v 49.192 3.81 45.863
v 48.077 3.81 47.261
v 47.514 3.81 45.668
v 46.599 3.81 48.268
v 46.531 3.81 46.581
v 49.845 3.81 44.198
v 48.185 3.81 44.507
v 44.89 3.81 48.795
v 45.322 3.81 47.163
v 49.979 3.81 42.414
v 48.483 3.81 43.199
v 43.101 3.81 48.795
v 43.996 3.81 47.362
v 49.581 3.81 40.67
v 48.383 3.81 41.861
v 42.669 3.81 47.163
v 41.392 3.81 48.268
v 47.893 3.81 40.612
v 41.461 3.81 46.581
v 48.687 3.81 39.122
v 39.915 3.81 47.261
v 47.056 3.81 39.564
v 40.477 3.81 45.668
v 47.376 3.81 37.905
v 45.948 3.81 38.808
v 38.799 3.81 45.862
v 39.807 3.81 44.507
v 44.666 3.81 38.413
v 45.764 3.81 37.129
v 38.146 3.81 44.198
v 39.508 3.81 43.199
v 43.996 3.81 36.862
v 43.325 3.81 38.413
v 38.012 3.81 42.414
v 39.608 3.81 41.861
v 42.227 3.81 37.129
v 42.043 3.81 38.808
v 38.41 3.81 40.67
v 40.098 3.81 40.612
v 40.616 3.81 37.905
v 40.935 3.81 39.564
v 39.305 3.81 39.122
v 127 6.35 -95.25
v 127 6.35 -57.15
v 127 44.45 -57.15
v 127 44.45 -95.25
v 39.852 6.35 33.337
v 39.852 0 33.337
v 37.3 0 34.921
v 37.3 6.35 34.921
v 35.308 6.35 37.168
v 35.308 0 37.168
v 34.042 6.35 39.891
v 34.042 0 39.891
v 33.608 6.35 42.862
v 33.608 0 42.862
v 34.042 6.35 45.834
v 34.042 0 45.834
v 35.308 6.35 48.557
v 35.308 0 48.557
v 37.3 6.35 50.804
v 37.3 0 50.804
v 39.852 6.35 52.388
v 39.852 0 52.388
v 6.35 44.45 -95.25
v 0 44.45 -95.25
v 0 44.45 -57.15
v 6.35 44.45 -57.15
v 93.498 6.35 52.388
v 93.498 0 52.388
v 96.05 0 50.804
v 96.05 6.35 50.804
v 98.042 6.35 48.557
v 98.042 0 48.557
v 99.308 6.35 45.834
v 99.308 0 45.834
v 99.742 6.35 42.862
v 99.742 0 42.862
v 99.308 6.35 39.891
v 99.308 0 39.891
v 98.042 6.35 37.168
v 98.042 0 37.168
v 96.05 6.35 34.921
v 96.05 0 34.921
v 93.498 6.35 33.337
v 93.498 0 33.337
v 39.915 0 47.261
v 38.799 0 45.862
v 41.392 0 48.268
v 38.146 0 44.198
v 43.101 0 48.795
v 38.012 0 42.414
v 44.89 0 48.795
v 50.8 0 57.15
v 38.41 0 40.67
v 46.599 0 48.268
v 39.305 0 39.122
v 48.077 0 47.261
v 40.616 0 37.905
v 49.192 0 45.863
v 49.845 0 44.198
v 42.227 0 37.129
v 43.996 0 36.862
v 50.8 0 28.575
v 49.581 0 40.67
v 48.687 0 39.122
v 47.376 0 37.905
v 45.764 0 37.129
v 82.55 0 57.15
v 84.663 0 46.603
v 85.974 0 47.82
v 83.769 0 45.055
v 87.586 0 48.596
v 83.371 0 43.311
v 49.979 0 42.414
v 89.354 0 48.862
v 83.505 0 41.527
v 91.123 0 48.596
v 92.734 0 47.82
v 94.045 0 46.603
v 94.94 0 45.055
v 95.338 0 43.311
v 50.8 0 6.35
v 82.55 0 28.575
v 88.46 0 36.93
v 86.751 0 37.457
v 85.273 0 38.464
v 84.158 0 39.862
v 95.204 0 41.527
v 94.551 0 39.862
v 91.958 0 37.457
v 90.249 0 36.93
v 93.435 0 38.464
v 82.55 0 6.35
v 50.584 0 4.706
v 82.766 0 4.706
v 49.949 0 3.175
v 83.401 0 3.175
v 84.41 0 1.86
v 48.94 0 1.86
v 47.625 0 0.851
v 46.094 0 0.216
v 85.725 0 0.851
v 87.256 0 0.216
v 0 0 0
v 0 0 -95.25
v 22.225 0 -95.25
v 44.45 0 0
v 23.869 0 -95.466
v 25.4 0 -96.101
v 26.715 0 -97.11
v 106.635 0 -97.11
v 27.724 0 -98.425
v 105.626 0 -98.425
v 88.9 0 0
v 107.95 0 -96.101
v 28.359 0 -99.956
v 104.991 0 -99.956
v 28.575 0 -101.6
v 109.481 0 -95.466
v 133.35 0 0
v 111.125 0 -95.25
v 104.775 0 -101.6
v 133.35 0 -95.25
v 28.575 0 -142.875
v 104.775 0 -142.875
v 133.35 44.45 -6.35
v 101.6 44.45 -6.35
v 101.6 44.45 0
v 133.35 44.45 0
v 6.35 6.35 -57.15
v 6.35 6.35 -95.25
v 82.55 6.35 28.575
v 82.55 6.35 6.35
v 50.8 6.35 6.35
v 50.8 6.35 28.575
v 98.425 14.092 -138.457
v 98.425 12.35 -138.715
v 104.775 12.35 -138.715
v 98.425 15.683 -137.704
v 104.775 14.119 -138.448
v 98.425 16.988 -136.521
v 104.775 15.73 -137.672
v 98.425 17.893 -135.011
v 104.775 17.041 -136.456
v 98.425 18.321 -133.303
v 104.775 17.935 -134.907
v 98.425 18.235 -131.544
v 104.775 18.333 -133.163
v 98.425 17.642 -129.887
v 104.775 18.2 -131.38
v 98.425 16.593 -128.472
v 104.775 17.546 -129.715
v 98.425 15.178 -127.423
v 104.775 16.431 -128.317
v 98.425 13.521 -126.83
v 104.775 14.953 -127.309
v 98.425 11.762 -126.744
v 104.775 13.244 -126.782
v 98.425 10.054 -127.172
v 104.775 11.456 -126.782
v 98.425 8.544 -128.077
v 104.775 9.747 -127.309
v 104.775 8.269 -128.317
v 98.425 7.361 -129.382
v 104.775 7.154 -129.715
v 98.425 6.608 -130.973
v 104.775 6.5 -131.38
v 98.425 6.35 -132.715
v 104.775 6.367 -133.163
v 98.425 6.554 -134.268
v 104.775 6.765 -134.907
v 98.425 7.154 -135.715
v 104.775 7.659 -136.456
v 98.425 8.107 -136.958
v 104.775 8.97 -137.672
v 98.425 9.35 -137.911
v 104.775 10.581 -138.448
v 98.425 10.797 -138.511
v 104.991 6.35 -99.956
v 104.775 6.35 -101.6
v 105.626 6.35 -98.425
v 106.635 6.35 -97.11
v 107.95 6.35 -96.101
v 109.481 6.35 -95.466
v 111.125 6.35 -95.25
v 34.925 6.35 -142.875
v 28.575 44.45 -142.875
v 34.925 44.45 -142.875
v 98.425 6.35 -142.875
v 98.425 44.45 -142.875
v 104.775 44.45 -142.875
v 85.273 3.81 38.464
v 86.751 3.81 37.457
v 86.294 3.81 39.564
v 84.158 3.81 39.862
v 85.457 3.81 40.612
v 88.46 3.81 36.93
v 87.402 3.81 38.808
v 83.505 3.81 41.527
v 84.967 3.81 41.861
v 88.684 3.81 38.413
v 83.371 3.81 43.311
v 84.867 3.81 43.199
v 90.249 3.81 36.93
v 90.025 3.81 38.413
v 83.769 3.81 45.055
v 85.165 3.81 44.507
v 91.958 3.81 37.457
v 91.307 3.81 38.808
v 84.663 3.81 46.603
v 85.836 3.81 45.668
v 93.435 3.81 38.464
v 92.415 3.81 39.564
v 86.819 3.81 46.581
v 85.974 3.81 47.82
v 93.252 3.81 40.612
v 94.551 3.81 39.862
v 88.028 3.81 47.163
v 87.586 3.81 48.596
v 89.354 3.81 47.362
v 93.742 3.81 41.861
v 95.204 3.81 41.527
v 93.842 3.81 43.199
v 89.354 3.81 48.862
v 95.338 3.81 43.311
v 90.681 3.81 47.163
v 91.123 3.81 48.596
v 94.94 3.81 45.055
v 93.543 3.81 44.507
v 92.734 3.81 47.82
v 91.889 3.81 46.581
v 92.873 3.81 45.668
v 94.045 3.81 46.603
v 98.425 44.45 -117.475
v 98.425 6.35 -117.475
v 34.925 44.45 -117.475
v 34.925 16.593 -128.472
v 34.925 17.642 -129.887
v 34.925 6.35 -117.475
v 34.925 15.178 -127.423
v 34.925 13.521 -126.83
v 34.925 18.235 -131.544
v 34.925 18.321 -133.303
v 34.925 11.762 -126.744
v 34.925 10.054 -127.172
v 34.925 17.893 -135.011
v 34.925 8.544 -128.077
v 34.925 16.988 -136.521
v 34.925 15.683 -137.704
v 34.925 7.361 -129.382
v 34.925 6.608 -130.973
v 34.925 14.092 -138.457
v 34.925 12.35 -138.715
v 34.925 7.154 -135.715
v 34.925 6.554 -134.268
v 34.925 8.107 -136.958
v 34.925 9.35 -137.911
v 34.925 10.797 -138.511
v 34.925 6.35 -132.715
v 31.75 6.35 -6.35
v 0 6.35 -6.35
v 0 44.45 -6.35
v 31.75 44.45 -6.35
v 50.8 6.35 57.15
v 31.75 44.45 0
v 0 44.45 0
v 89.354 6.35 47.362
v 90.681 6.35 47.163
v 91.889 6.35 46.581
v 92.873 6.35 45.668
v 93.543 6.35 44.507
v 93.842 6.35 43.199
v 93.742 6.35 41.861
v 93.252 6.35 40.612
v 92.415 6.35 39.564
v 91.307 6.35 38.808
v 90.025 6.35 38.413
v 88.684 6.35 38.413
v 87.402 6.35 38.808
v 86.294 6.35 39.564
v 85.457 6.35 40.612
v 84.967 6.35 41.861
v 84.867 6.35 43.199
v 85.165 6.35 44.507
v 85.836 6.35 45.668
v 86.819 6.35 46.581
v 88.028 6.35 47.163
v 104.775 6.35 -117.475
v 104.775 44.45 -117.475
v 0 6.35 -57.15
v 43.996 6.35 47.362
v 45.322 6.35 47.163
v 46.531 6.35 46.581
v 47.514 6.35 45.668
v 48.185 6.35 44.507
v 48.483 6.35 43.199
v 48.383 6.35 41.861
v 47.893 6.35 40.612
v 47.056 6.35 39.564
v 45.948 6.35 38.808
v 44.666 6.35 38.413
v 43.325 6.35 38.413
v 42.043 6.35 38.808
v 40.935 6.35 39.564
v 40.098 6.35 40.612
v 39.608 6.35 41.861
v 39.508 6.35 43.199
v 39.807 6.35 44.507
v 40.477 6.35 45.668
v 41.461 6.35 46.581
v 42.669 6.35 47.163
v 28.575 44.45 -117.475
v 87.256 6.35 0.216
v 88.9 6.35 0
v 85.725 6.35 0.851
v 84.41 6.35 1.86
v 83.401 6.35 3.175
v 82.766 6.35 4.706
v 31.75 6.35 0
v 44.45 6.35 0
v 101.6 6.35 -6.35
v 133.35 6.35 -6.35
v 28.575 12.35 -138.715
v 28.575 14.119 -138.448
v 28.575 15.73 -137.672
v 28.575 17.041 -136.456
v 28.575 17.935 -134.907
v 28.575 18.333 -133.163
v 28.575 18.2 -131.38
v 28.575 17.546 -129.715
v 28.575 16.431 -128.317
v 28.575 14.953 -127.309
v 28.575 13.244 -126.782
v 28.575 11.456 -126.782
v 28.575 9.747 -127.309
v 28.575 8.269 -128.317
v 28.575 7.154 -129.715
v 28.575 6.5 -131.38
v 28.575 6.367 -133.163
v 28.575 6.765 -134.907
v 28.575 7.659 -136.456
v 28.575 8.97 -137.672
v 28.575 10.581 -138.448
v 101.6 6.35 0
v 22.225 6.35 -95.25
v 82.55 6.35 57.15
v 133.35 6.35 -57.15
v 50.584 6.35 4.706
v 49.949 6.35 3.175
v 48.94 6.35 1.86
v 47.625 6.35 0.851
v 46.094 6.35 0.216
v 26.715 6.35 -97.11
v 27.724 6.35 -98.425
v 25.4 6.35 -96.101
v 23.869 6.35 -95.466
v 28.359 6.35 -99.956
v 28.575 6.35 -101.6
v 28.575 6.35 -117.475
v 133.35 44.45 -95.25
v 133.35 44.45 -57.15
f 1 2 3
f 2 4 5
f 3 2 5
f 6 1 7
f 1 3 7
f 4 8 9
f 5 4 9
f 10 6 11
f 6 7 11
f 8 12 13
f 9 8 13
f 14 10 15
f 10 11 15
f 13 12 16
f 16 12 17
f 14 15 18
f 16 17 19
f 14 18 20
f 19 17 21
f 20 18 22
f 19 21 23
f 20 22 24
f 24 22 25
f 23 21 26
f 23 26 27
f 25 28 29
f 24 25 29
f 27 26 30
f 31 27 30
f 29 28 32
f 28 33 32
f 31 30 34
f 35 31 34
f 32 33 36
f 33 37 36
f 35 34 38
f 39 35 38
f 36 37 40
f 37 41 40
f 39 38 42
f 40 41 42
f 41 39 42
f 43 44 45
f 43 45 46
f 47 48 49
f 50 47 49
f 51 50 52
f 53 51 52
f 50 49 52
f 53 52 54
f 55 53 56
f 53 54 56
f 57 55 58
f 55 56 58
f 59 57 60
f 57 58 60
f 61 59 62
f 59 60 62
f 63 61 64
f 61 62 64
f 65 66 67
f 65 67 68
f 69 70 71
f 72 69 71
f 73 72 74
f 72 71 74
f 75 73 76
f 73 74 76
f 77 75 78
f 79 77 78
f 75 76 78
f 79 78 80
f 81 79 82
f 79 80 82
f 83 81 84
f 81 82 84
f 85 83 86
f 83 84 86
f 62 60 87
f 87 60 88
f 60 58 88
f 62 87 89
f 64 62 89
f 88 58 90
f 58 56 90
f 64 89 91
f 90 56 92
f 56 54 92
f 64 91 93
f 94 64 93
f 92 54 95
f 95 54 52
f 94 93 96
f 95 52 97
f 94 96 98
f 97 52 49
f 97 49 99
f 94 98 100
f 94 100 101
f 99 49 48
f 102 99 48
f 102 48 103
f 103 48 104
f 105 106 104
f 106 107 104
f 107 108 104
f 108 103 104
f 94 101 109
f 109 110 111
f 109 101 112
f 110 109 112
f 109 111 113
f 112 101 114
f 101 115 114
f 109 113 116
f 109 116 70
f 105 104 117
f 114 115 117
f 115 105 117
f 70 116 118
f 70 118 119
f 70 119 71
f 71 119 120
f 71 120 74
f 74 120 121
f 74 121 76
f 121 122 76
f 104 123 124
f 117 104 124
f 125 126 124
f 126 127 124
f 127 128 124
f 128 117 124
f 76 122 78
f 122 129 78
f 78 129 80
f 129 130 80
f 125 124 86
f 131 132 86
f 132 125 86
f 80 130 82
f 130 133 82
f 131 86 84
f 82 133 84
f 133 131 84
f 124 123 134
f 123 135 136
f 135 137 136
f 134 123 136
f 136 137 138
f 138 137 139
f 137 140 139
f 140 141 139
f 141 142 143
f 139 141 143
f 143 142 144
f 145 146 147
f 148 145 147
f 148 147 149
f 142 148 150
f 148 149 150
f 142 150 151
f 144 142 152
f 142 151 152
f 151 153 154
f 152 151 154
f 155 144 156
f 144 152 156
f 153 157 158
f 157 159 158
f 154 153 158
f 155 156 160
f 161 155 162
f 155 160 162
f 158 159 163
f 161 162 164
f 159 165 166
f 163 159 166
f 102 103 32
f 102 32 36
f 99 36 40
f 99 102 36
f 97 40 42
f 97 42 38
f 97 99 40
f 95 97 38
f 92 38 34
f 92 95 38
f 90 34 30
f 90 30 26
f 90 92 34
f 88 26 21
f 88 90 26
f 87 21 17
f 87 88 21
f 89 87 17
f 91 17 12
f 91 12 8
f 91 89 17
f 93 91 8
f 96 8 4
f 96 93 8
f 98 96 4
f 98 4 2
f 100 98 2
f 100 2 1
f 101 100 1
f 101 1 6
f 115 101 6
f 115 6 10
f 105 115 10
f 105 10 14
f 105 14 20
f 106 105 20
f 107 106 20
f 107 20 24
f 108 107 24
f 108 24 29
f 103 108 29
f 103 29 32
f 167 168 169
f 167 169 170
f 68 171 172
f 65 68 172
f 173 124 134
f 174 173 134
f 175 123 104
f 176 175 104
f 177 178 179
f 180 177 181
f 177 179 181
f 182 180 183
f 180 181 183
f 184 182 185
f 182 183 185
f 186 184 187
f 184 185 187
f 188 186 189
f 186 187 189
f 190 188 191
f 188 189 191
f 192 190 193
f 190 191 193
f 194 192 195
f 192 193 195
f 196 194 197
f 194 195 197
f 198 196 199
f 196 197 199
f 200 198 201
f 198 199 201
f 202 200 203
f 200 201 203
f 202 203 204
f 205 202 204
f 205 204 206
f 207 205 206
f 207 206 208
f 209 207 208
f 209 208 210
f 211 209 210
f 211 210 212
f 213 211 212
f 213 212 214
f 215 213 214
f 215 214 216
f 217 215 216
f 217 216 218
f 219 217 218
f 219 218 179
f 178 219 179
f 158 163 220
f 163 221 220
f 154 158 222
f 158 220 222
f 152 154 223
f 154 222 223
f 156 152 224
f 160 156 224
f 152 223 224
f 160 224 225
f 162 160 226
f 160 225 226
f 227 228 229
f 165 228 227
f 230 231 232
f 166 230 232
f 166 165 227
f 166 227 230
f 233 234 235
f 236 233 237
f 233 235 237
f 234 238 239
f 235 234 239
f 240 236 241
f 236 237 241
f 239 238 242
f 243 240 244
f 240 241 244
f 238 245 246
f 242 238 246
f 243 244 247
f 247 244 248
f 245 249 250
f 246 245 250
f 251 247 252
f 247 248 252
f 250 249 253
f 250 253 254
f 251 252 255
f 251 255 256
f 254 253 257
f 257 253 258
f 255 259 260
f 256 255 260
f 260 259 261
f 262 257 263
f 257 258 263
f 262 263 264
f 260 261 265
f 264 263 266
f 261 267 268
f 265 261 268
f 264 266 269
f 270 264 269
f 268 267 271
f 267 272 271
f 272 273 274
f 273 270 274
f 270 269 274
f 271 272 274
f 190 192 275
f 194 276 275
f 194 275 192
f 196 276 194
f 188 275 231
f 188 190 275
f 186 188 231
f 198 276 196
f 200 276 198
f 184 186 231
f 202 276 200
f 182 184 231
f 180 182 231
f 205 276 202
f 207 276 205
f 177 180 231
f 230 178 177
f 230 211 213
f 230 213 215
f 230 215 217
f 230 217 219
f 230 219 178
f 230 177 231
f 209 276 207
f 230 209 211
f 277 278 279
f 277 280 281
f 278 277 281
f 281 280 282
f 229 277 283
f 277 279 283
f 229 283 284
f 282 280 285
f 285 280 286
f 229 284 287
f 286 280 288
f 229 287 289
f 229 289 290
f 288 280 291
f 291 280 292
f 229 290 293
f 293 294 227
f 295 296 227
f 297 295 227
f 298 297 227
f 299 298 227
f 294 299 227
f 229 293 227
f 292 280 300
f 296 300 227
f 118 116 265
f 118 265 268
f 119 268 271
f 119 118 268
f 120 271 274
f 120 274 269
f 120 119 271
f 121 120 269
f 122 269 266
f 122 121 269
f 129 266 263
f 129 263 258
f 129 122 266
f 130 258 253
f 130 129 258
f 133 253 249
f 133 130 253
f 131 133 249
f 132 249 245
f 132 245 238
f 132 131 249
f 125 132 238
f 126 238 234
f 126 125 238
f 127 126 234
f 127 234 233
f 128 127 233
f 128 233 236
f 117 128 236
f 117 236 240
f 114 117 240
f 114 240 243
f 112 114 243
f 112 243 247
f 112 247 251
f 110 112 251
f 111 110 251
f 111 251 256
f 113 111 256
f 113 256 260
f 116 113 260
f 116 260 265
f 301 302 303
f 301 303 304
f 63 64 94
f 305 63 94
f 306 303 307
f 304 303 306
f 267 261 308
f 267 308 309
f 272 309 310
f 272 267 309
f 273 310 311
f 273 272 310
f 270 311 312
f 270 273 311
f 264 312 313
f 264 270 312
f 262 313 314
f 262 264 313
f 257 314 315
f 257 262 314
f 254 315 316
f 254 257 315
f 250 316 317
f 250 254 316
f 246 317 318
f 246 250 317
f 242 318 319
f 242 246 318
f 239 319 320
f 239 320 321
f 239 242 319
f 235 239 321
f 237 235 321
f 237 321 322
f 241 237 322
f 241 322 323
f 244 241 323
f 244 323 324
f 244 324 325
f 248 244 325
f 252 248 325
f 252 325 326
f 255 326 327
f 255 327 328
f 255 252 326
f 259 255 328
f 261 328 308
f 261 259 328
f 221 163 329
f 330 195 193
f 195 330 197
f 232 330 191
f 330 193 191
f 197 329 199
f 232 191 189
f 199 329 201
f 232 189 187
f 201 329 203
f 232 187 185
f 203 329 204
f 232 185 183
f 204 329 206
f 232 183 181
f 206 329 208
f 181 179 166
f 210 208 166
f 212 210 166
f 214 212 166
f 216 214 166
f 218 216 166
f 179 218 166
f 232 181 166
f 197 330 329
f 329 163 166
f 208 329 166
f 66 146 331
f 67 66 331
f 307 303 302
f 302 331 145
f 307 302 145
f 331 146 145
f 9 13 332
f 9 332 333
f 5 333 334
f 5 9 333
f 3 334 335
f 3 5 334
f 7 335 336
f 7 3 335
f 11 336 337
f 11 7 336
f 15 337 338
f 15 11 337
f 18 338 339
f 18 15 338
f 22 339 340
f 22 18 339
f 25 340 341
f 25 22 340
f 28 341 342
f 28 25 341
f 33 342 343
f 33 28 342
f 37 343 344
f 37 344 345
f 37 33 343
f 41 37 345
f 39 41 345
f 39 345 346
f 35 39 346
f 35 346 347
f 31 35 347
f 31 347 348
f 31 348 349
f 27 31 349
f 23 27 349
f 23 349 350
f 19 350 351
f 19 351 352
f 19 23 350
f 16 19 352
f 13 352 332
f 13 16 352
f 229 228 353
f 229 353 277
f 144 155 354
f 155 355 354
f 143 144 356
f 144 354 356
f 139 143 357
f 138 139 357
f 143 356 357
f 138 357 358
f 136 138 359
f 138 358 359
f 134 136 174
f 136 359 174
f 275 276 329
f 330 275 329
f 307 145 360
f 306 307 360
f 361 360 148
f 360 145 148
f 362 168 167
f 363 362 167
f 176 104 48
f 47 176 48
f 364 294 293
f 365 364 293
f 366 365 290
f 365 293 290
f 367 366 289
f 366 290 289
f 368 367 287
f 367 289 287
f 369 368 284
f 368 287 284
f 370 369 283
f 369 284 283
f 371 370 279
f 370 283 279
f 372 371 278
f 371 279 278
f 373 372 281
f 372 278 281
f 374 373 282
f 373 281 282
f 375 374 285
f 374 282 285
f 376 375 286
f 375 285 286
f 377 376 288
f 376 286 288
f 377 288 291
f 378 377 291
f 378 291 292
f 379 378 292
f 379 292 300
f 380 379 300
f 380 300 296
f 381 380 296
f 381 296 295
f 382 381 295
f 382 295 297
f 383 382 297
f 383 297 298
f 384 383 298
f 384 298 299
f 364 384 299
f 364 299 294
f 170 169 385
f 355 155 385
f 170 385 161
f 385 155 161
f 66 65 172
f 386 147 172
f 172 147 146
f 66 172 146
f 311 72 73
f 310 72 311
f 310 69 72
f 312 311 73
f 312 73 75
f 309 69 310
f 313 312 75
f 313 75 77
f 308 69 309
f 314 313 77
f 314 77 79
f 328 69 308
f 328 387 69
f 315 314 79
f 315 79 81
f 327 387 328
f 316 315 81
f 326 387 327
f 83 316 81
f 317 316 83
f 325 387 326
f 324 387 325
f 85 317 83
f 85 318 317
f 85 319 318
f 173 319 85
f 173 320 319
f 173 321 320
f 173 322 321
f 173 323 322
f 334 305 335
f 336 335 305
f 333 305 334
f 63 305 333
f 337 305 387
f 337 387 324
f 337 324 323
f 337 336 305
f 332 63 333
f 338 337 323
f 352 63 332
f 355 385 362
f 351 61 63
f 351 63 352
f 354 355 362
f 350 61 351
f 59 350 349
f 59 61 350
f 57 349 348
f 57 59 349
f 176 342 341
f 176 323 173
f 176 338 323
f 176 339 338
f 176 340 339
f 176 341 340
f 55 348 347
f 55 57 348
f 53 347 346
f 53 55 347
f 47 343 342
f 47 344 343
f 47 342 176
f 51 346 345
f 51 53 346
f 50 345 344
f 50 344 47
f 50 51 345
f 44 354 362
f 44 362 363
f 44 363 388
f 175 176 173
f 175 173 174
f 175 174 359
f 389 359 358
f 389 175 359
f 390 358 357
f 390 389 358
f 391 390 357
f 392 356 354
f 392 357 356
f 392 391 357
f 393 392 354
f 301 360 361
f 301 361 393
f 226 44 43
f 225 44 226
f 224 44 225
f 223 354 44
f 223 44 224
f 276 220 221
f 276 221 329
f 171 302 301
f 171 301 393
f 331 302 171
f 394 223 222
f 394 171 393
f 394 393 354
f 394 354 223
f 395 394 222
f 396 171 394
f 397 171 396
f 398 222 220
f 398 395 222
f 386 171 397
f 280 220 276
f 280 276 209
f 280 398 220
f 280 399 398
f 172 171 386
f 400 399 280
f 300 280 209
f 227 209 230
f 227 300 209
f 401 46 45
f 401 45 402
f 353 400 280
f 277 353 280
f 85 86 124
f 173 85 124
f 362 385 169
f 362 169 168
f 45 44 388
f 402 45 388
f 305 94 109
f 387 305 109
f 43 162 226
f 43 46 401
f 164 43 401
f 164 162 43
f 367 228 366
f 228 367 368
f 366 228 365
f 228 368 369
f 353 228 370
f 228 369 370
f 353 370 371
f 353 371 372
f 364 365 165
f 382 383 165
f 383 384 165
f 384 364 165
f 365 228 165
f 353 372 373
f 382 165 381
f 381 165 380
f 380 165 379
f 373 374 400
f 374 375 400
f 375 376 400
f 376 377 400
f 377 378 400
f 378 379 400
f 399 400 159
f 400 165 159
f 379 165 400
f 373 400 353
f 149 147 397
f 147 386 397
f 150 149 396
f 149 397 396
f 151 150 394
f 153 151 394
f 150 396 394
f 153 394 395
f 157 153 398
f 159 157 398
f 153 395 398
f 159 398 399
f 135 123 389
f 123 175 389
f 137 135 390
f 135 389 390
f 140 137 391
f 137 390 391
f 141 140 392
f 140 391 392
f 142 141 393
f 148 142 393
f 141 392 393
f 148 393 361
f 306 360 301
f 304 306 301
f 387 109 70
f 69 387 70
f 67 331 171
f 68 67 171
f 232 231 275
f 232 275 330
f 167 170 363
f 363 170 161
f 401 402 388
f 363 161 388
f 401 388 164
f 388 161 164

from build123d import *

# Parameters (mm, degrees)
SKETCH1_R           = 6
BOSS_EXTRUDE1_DEPTH = 6.35
SKETCH2_W           = 6.35
SKETCH2_H           = 38.1
SKETCH2_W_2         = 31.75
SKETCH2_H_2         = 6.35
MOTORMOUNT_DEPTH    = 38.1
SKETCH4_W           = 6.35
SKETCH4_H           = 25.4
WHEELMOUNTS_DEPTH   = 38.1
FILLET1_R           = 6.35
BOSS_EXTRUDE4_START = -2.54
SKETCH5_R           = 6
SKETCH5_R_2         = 4.5
BOSS_EXTRUDE4_DEPTH = 2.54
SKETCH6_R           = 6
CUT_EXTRUDE2_DEPTH  = 83.947
FILLET2_R           = 6.35


with BuildPart() as part:
    # Sketch1 → Boss-Extrude1 (new body)
    with BuildSketch(Plane(origin=(0, 0, 0), x_dir=(1, 0, 0), z_dir=(0, 1, 0))):
        with BuildLine():
            Line((50.8, 0), (50.8, -28.575))
            Line((50.8, -28.575), (39.852082176, -33.3375))
            ThreePointArc((39.852082176, -33.3375), (33.608374366, -42.8625), (39.852082176, -52.3875))
            Line((39.852082176, -52.3875), (50.8, -57.15))
            Line((50.8, -57.15), (82.55, -57.15))
            Line((82.55, -57.15), (93.497917824, -52.3875))
            ThreePointArc((93.497917824, -52.3875), (99.741625634, -42.8625), (93.497917824, -33.3375))
            Line((93.497917824, -33.3375), (82.55, -28.575))
            Line((82.55, -28.575), (82.55, 0))
            Line((82.55, 0), (133.35, 0))
            Line((133.35, 0), (133.35, 95.25))
            Line((133.35, 95.25), (104.775, 95.25))
            Line((104.775, 95.25), (104.775, 142.875))
            Line((104.775, 142.875), (28.575, 142.875))
            Line((28.575, 142.875), (28.575, 95.25))
            Line((28.575, 95.25), (0, 95.25))
            Line((0, 95.25), (0, 0))
            Line((0, 0), (50.8, 0))
        make_face()
        with Locations(Location((89.354407321, -42.8625, 0), (0, 0, 270))):
            Circle(SKETCH1_R, mode=Mode.SUBTRACT)
        with Locations(Location((43.995592679, -42.8625, 0), (0, 0, 90))):
            Circle(SKETCH1_R, mode=Mode.SUBTRACT)
    extrude(amount=BOSS_EXTRUDE1_DEPTH)

    # Sketch2 → MotorMount (add)
    with BuildSketch(Plane(origin=(0, 6.35, 0), x_dir=(1, 0, 0), z_dir=(0, 1, 0))):
        with Locations((130.175, 76.2)):
            Rectangle(SKETCH2_W, SKETCH2_H)
        with Locations((3.175, 76.2)):
            Rectangle(SKETCH2_W, SKETCH2_H)
        with Locations((15.875, 3.175)):
            Rectangle(SKETCH2_W_2, SKETCH2_H_2)
        with Locations((117.475, 3.175)):
            Rectangle(SKETCH2_W_2, SKETCH2_H_2)
    extrude(amount=MOTORMOUNT_DEPTH)

    # Sketch4 → WheelMounts (add)
    with BuildSketch(Plane(origin=(0, 6.35, 0), x_dir=(1, 0, 0), z_dir=(0, 1, 0))):
        with Locations((101.6, 130.175)):
            Rectangle(SKETCH4_W, SKETCH4_H)
        with Locations((31.75, 130.175)):
            Rectangle(SKETCH4_W, SKETCH4_H)
    extrude(amount=WHEELMOUNTS_DEPTH)

    # Fillet1
    fillet1_edges = [part.edges().sort_by_distance(p)[0] for p in [
        (82.55, 3.175, 0),
        (50.8, 3.175, 0),
    ]]
    fillet(fillet1_edges, radius=FILLET1_R)

    # Sketch5 → Boss-Extrude4 (add)
    # profile 1 of 2: a face of its own
    with BuildSketch(Plane(origin=(0, 6.35, 0), x_dir=(1, 0, 0), z_dir=(0, 1, 0)).offset(BOSS_EXTRUDE4_START)):
        with Locations(Location((43.995592679, -42.8625, 0), (0, 0, 90))):
            Circle(SKETCH5_R)
        with Locations(Location((43.995592679, -42.8625, 0), (0, 0, 270))):
            Circle(SKETCH5_R_2, mode=Mode.SUBTRACT)
    # profile 2 of 2: a face of its own
    with BuildSketch(Plane(origin=(0, 6.35, 0), x_dir=(1, 0, 0), z_dir=(0, 1, 0)).offset(BOSS_EXTRUDE4_START)):
        with Locations(Location((89.354407321, -42.8625, 0), (0, 0, 270))):
            Circle(SKETCH5_R)
        with Locations(Location((89.354407321, -42.8625, 0), (0, 0, 270))):
            Circle(SKETCH5_R_2, mode=Mode.SUBTRACT)
    extrude(amount=BOSS_EXTRUDE4_DEPTH)

    # Sketch6 → Cut-Extrude2 (cut)
    with BuildSketch(Plane(origin=(104.775, 0, 0), x_dir=(0, 0, -1), z_dir=(1, 0, 0))):
        with Locations((132.715, 12.35)):
            Circle(SKETCH6_R)
    extrude(amount=-CUT_EXTRUDE2_DEPTH, mode=Mode.SUBTRACT)

    # Fillet2
    fillet2_edges = [part.edges().sort_by_distance(p)[0] for p in [
        (28.575, 3.175, -95.25),
        (104.775, 3.175, -95.25),
    ]]
    fillet(fillet2_edges, radius=FILLET2_R)


solid = part.part
